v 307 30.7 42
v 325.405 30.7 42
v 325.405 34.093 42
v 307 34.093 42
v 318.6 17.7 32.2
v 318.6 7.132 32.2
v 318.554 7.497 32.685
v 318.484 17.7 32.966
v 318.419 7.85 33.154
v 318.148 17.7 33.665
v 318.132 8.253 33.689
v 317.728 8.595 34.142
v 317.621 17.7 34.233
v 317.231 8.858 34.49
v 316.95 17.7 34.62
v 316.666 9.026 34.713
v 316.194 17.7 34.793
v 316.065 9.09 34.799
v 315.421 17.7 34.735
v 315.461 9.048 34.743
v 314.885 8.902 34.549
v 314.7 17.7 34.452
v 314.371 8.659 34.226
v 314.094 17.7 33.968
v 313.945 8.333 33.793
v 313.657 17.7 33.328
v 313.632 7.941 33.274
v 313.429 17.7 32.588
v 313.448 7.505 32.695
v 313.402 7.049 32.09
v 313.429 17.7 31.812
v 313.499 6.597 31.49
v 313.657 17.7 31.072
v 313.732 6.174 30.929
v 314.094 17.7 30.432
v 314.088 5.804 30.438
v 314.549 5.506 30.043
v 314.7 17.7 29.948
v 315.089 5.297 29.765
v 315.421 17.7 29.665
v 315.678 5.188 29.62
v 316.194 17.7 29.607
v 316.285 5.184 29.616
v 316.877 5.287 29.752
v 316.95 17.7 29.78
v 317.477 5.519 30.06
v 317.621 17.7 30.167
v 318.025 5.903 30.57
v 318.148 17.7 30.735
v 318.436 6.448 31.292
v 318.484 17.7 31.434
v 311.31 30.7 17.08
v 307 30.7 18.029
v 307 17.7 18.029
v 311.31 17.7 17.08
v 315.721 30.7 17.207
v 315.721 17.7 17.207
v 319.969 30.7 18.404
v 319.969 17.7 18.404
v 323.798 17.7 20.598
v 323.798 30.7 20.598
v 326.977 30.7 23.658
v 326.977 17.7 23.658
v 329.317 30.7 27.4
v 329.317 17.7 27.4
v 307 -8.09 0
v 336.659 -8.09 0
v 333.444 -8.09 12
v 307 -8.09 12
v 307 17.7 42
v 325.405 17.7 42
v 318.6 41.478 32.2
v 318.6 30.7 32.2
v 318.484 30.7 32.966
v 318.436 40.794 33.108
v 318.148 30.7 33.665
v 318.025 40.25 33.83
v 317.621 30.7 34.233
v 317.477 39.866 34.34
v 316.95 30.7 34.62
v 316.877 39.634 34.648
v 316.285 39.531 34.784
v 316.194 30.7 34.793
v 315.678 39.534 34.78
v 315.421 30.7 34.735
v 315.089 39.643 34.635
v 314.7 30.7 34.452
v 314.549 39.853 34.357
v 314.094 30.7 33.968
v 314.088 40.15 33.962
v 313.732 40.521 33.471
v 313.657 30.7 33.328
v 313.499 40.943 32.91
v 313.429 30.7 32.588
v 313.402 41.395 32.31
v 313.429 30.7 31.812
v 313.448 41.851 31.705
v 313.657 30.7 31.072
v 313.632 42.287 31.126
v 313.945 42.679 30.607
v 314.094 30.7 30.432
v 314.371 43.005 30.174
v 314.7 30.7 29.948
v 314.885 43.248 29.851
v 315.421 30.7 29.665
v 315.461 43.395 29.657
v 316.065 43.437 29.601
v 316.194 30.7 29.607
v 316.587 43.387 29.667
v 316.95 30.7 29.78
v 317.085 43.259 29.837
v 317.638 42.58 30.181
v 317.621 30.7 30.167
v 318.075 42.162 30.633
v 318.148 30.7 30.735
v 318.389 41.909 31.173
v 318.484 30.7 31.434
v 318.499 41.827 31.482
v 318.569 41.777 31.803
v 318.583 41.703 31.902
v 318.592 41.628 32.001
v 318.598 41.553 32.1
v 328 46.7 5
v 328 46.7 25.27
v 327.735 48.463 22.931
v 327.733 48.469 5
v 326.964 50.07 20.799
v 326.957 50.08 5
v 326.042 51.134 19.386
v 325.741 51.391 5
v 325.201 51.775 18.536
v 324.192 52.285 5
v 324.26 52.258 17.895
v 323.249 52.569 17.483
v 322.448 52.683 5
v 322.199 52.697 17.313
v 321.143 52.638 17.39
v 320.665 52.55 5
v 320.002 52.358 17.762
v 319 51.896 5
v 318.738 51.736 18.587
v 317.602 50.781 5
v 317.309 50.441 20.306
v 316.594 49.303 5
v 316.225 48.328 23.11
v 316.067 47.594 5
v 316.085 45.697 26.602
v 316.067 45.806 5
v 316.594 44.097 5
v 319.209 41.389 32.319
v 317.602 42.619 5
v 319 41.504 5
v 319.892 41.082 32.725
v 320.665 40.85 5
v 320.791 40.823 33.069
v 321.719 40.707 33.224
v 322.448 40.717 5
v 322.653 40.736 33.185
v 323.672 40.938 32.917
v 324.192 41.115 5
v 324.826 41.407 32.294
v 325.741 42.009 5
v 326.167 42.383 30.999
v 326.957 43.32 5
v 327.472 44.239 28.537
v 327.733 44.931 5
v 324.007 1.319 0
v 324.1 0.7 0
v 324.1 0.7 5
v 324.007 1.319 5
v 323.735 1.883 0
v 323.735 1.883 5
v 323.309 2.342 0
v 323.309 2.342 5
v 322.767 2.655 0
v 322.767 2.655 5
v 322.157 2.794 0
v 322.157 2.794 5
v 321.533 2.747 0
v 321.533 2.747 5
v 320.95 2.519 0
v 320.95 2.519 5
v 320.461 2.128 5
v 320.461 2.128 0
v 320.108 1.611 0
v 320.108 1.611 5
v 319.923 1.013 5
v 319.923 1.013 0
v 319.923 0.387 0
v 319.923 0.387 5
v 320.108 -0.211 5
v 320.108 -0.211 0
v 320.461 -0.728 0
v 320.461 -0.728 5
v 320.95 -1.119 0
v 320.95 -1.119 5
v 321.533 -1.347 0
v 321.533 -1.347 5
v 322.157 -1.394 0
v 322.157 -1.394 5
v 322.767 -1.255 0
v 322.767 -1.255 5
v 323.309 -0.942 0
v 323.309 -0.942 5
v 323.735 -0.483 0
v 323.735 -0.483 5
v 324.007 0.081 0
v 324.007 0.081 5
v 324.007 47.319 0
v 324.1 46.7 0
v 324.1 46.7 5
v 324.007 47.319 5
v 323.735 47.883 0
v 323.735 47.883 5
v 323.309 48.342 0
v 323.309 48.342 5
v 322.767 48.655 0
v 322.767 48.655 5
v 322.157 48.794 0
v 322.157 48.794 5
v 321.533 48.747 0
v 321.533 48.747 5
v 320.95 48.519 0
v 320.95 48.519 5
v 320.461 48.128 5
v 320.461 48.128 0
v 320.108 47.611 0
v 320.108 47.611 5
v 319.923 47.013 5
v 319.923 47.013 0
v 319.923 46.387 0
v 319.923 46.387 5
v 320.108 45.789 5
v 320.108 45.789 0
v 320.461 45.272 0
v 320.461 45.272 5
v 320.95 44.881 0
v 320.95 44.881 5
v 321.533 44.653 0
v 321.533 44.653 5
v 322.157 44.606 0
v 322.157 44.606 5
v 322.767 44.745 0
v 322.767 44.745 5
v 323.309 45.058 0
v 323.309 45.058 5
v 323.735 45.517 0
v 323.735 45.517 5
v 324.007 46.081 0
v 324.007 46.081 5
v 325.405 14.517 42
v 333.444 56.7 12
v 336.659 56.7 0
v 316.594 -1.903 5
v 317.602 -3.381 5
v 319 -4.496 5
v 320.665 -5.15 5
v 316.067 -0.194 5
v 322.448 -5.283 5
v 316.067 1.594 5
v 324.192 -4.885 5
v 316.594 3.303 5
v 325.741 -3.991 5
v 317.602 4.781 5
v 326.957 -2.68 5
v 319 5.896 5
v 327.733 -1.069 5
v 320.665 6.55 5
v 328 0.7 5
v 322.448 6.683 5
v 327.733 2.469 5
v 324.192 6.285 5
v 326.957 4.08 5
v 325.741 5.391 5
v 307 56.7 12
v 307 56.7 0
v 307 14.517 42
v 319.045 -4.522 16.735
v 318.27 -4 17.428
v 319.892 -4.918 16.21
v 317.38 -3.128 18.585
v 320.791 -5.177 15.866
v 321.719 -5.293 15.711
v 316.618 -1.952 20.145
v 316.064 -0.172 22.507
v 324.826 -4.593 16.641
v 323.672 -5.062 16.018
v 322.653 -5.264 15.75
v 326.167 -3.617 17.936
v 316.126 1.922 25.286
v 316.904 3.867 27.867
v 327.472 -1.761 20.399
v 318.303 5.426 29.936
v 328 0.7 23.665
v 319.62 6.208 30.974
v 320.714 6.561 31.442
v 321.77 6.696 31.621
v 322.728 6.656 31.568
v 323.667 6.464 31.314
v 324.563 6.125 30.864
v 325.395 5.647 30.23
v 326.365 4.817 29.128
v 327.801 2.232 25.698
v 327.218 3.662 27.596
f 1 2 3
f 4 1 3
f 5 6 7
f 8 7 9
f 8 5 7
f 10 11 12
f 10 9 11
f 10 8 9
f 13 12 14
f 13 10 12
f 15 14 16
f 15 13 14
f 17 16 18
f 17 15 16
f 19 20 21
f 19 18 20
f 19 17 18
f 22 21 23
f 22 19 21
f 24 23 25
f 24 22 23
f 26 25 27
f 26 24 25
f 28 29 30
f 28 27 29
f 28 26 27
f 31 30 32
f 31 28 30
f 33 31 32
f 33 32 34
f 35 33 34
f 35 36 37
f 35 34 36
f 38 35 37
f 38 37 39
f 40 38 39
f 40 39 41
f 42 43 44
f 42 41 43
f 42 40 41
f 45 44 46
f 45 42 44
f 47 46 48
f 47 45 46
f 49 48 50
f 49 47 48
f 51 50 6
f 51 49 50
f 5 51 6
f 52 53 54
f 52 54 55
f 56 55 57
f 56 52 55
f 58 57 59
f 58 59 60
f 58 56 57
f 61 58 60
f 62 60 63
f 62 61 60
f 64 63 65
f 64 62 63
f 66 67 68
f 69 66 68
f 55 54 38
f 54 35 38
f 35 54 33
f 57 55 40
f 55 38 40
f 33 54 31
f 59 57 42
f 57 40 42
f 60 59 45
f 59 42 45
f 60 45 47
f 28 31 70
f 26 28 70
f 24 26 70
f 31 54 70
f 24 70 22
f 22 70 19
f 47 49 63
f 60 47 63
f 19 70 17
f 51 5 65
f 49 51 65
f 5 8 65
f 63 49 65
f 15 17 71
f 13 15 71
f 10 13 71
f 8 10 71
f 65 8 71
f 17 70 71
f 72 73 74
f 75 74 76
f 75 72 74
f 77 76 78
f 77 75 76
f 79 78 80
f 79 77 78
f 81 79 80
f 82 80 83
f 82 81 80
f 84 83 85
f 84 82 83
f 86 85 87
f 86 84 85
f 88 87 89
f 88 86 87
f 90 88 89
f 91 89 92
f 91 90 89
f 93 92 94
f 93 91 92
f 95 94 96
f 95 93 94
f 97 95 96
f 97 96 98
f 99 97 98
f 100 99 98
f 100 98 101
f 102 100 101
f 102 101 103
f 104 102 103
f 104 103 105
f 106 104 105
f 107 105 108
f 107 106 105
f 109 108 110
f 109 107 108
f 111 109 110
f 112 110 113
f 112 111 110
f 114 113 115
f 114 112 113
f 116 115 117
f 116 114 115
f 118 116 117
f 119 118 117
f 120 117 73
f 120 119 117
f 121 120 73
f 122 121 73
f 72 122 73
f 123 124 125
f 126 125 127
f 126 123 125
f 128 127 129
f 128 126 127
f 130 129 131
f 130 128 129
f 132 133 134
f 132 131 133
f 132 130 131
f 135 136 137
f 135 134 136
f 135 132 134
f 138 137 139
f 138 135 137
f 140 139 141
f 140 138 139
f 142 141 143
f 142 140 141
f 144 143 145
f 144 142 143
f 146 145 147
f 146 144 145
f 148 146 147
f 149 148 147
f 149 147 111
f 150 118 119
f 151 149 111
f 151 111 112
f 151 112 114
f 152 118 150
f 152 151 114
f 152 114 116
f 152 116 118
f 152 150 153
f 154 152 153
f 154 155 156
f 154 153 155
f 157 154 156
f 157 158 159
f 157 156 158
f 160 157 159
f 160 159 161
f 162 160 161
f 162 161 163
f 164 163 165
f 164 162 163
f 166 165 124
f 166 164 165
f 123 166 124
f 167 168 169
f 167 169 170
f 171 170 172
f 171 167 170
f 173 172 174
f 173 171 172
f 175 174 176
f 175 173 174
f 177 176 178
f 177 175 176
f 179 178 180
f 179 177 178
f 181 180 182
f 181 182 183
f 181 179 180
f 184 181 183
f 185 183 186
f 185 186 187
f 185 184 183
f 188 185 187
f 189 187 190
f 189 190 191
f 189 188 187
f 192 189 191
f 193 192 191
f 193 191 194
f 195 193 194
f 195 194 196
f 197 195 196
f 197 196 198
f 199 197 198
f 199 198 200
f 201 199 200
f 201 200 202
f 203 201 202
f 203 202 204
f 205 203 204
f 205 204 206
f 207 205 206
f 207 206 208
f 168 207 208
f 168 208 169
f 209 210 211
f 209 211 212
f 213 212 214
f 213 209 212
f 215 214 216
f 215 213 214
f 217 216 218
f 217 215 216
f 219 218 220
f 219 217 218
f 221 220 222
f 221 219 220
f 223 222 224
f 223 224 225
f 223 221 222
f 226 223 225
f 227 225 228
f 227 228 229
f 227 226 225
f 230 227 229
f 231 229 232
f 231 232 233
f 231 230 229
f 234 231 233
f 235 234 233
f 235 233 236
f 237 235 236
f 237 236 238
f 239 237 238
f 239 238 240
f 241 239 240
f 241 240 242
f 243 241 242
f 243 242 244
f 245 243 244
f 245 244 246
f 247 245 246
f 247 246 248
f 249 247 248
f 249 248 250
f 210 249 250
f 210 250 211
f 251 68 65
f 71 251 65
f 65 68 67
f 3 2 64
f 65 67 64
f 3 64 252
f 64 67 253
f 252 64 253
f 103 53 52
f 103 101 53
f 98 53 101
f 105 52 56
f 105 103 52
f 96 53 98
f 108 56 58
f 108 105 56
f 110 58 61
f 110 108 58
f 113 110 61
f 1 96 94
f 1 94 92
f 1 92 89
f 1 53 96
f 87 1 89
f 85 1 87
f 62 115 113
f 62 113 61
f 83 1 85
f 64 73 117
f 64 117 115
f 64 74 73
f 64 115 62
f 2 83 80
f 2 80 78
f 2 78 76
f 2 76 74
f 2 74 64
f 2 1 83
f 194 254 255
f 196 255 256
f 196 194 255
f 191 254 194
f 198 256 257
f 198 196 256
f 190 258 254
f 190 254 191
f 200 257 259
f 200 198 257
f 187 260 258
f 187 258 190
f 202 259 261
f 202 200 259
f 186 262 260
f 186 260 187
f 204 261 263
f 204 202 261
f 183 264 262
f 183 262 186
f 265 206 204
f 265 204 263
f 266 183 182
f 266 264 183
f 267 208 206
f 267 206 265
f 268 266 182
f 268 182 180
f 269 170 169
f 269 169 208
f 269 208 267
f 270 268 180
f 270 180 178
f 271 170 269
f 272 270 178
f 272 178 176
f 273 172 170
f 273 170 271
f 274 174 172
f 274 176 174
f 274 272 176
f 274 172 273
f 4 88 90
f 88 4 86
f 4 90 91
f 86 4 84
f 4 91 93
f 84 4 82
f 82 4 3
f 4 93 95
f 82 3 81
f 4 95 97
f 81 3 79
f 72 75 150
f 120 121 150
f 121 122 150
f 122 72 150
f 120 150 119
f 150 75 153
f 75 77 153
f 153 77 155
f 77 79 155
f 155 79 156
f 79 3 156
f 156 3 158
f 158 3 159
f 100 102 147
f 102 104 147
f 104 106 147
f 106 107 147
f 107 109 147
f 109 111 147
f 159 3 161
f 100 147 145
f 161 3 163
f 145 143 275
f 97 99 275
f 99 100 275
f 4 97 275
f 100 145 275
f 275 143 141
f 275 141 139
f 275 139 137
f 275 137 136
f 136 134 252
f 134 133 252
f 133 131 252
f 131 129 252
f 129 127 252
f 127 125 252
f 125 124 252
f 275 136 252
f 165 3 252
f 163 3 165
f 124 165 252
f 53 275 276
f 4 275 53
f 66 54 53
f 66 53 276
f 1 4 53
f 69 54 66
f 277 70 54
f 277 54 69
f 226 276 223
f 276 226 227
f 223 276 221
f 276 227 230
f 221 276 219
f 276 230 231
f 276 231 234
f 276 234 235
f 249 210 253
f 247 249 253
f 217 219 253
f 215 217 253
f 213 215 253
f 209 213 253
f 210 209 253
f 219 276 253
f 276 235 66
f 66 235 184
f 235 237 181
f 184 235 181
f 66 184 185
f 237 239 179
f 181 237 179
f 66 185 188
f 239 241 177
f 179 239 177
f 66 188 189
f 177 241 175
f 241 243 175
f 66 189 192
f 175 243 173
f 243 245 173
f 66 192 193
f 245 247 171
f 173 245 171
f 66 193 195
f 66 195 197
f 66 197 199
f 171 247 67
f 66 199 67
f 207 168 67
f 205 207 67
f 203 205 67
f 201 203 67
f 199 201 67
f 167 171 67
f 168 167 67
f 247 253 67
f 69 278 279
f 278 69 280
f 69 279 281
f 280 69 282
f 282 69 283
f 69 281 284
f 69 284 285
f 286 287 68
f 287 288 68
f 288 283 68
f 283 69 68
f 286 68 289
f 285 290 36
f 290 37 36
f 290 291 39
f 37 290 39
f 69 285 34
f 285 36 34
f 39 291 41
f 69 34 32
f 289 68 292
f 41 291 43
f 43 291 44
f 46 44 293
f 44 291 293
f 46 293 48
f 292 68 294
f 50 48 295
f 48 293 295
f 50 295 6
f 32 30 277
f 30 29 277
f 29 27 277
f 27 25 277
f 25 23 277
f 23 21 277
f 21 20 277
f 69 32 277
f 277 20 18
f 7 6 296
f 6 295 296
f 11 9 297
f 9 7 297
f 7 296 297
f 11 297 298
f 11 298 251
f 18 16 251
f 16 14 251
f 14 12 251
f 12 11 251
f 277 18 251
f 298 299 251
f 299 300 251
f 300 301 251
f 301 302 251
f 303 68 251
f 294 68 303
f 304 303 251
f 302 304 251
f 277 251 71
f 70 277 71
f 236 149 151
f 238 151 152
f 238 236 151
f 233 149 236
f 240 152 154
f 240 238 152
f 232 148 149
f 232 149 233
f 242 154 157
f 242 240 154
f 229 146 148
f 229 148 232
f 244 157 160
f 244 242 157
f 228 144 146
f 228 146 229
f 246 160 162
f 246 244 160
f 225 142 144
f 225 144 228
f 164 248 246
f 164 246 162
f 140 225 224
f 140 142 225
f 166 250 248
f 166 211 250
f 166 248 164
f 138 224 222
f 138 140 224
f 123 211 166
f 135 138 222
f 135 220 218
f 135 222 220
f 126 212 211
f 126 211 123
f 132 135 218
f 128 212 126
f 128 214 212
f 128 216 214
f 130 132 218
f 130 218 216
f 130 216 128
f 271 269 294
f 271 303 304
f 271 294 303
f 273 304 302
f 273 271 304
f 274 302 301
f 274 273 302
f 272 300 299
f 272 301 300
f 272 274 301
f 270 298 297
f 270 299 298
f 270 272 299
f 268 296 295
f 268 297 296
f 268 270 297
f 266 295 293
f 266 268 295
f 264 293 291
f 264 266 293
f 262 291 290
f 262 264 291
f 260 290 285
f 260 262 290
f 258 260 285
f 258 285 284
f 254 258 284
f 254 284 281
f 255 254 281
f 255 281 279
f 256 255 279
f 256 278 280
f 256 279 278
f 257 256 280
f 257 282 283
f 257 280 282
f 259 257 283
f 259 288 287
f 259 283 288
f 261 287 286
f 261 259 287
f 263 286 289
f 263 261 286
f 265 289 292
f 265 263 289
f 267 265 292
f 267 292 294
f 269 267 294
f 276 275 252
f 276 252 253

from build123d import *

# Parameters (mm, degrees)
BOX043_W               = 14
BOX043_H               = 73
BOX043_DEPTH           = 51
BOX043_PLACEMENT_ANGLE = 15
CYLINDER122_R          = 2.6
CYLINDER122_DEPTH      = 47
CYLINDER117_R          = 6
CYLINDER117_DEPTH      = 40
CYLINDER118_R          = 2.1
CYLINDER118_DEPTH      = 10
CYLINDER119_R          = 6
CYLINDER119_DEPTH      = 40
CYLINDER120_R          = 2.1
CYLINDER120_DEPTH      = 10
CYLINDER121_R          = 18
CYLINDER121_DEPTH      = 13
EXTRUDE035_DEPTH       = 30


with BuildPart() as box043:
    # Box043 → Box043 (new body)
    with BuildSketch(Plane.XY):
        with Locations((7, 36.5)):
            Rectangle(BOX043_W, BOX043_H)
    extrude(amount=BOX043_DEPTH)


with BuildPart() as box043_1:
    # Box043 placement: moved
    add(box043.part.moved(Location((336.936297, -53.3, -1.035276))).rotate(Axis((336.936297, -53.3, -1.035276), (0, -1, 0)), BOX043_PLACEMENT_ANGLE))


with BuildPart() as cylinder122:
    # Cylinder122 → Cylinder122 (new body)
    with BuildSketch(Plane(origin=(316, 5.5, 32.2), x_dir=(1, 0, 0), z_dir=(0, -1, 0))):
        Circle(CYLINDER122_R)
    extrude(amount=CYLINDER122_DEPTH)


with BuildPart() as cylinder117:
    # Cylinder117 → Cylinder117 (new body)
    with BuildSketch(Plane.XY.offset(10)):
        Circle(CYLINDER117_R)
    extrude(amount=CYLINDER117_DEPTH)


with BuildPart() as fusion056:
    # Cylinder118 → Cylinder118 (new body)
    with BuildSketch(Plane.XY):
        Circle(CYLINDER118_R)
    extrude(amount=CYLINDER118_DEPTH)

    # Fusion056: union Cylinder117
    add(cylinder117.part)


with BuildPart() as fusion056_1:
    # Fusion056 placement: moved
    add(fusion056.part.moved(Location((322, 5, -5))))


with BuildPart() as cylinder119:
    # Cylinder119 → Cylinder119 (new body)
    with BuildSketch(Plane.XY.offset(10)):
        Circle(CYLINDER119_R)
    extrude(amount=CYLINDER119_DEPTH)


with BuildPart() as fusion057:
    # Cylinder120 → Cylinder120 (new body)
    with BuildSketch(Plane.XY):
        Circle(CYLINDER120_R)
    extrude(amount=CYLINDER120_DEPTH)

    # Fusion057: union Cylinder119
    add(cylinder119.part)


with BuildPart() as fusion057_1:
    # Fusion057 placement: moved
    add(fusion057.part.moved(Location((322, -41, -5))))


with BuildPart() as cylinder121:
    # Cylinder121 → Cylinder121 (new body)
    with BuildSketch(Plane(origin=(313, -11, 35), x_dir=(1, 0, 0), z_dir=(0, -1, 0))):
        Circle(CYLINDER121_R)
    extrude(amount=CYLINDER121_DEPTH)


with BuildPart() as cut108:
    # Sketch028 → Extrude035 (new body)
    with BuildSketch(Plane.YZ):
        Polygon((15, 0), (-49.79, 0), (-49.79, 12), (-27.183378, 42), (-7.606622, 42), (15, 12), align=None)
    extrude(amount=-EXTRUDE035_DEPTH)


with BuildPart() as cut108_1:
    # Extrude035 placement: moved
    add(cut108.part.moved(Location((337, 0, 0))))

    # Cut104: cut Cylinder121
    add(cylinder121.part, mode=Mode.SUBTRACT)

    # Cut105: cut Fusion057
    add(fusion057_1.part, mode=Mode.SUBTRACT)

    # Cut106: cut Fusion056
    add(fusion056_1.part, mode=Mode.SUBTRACT)

    # Cut107: cut Cylinder122
    add(cylinder122.part, mode=Mode.SUBTRACT)

    # Cut108: cut Box043
    add(box043_1.part, mode=Mode.SUBTRACT)


with BuildPart() as cut108_2:
    # Cut108 placement: moved
    add(cut108_1.part.moved(Location((0, 41.7, 0))))


solid = cut108_2.part
